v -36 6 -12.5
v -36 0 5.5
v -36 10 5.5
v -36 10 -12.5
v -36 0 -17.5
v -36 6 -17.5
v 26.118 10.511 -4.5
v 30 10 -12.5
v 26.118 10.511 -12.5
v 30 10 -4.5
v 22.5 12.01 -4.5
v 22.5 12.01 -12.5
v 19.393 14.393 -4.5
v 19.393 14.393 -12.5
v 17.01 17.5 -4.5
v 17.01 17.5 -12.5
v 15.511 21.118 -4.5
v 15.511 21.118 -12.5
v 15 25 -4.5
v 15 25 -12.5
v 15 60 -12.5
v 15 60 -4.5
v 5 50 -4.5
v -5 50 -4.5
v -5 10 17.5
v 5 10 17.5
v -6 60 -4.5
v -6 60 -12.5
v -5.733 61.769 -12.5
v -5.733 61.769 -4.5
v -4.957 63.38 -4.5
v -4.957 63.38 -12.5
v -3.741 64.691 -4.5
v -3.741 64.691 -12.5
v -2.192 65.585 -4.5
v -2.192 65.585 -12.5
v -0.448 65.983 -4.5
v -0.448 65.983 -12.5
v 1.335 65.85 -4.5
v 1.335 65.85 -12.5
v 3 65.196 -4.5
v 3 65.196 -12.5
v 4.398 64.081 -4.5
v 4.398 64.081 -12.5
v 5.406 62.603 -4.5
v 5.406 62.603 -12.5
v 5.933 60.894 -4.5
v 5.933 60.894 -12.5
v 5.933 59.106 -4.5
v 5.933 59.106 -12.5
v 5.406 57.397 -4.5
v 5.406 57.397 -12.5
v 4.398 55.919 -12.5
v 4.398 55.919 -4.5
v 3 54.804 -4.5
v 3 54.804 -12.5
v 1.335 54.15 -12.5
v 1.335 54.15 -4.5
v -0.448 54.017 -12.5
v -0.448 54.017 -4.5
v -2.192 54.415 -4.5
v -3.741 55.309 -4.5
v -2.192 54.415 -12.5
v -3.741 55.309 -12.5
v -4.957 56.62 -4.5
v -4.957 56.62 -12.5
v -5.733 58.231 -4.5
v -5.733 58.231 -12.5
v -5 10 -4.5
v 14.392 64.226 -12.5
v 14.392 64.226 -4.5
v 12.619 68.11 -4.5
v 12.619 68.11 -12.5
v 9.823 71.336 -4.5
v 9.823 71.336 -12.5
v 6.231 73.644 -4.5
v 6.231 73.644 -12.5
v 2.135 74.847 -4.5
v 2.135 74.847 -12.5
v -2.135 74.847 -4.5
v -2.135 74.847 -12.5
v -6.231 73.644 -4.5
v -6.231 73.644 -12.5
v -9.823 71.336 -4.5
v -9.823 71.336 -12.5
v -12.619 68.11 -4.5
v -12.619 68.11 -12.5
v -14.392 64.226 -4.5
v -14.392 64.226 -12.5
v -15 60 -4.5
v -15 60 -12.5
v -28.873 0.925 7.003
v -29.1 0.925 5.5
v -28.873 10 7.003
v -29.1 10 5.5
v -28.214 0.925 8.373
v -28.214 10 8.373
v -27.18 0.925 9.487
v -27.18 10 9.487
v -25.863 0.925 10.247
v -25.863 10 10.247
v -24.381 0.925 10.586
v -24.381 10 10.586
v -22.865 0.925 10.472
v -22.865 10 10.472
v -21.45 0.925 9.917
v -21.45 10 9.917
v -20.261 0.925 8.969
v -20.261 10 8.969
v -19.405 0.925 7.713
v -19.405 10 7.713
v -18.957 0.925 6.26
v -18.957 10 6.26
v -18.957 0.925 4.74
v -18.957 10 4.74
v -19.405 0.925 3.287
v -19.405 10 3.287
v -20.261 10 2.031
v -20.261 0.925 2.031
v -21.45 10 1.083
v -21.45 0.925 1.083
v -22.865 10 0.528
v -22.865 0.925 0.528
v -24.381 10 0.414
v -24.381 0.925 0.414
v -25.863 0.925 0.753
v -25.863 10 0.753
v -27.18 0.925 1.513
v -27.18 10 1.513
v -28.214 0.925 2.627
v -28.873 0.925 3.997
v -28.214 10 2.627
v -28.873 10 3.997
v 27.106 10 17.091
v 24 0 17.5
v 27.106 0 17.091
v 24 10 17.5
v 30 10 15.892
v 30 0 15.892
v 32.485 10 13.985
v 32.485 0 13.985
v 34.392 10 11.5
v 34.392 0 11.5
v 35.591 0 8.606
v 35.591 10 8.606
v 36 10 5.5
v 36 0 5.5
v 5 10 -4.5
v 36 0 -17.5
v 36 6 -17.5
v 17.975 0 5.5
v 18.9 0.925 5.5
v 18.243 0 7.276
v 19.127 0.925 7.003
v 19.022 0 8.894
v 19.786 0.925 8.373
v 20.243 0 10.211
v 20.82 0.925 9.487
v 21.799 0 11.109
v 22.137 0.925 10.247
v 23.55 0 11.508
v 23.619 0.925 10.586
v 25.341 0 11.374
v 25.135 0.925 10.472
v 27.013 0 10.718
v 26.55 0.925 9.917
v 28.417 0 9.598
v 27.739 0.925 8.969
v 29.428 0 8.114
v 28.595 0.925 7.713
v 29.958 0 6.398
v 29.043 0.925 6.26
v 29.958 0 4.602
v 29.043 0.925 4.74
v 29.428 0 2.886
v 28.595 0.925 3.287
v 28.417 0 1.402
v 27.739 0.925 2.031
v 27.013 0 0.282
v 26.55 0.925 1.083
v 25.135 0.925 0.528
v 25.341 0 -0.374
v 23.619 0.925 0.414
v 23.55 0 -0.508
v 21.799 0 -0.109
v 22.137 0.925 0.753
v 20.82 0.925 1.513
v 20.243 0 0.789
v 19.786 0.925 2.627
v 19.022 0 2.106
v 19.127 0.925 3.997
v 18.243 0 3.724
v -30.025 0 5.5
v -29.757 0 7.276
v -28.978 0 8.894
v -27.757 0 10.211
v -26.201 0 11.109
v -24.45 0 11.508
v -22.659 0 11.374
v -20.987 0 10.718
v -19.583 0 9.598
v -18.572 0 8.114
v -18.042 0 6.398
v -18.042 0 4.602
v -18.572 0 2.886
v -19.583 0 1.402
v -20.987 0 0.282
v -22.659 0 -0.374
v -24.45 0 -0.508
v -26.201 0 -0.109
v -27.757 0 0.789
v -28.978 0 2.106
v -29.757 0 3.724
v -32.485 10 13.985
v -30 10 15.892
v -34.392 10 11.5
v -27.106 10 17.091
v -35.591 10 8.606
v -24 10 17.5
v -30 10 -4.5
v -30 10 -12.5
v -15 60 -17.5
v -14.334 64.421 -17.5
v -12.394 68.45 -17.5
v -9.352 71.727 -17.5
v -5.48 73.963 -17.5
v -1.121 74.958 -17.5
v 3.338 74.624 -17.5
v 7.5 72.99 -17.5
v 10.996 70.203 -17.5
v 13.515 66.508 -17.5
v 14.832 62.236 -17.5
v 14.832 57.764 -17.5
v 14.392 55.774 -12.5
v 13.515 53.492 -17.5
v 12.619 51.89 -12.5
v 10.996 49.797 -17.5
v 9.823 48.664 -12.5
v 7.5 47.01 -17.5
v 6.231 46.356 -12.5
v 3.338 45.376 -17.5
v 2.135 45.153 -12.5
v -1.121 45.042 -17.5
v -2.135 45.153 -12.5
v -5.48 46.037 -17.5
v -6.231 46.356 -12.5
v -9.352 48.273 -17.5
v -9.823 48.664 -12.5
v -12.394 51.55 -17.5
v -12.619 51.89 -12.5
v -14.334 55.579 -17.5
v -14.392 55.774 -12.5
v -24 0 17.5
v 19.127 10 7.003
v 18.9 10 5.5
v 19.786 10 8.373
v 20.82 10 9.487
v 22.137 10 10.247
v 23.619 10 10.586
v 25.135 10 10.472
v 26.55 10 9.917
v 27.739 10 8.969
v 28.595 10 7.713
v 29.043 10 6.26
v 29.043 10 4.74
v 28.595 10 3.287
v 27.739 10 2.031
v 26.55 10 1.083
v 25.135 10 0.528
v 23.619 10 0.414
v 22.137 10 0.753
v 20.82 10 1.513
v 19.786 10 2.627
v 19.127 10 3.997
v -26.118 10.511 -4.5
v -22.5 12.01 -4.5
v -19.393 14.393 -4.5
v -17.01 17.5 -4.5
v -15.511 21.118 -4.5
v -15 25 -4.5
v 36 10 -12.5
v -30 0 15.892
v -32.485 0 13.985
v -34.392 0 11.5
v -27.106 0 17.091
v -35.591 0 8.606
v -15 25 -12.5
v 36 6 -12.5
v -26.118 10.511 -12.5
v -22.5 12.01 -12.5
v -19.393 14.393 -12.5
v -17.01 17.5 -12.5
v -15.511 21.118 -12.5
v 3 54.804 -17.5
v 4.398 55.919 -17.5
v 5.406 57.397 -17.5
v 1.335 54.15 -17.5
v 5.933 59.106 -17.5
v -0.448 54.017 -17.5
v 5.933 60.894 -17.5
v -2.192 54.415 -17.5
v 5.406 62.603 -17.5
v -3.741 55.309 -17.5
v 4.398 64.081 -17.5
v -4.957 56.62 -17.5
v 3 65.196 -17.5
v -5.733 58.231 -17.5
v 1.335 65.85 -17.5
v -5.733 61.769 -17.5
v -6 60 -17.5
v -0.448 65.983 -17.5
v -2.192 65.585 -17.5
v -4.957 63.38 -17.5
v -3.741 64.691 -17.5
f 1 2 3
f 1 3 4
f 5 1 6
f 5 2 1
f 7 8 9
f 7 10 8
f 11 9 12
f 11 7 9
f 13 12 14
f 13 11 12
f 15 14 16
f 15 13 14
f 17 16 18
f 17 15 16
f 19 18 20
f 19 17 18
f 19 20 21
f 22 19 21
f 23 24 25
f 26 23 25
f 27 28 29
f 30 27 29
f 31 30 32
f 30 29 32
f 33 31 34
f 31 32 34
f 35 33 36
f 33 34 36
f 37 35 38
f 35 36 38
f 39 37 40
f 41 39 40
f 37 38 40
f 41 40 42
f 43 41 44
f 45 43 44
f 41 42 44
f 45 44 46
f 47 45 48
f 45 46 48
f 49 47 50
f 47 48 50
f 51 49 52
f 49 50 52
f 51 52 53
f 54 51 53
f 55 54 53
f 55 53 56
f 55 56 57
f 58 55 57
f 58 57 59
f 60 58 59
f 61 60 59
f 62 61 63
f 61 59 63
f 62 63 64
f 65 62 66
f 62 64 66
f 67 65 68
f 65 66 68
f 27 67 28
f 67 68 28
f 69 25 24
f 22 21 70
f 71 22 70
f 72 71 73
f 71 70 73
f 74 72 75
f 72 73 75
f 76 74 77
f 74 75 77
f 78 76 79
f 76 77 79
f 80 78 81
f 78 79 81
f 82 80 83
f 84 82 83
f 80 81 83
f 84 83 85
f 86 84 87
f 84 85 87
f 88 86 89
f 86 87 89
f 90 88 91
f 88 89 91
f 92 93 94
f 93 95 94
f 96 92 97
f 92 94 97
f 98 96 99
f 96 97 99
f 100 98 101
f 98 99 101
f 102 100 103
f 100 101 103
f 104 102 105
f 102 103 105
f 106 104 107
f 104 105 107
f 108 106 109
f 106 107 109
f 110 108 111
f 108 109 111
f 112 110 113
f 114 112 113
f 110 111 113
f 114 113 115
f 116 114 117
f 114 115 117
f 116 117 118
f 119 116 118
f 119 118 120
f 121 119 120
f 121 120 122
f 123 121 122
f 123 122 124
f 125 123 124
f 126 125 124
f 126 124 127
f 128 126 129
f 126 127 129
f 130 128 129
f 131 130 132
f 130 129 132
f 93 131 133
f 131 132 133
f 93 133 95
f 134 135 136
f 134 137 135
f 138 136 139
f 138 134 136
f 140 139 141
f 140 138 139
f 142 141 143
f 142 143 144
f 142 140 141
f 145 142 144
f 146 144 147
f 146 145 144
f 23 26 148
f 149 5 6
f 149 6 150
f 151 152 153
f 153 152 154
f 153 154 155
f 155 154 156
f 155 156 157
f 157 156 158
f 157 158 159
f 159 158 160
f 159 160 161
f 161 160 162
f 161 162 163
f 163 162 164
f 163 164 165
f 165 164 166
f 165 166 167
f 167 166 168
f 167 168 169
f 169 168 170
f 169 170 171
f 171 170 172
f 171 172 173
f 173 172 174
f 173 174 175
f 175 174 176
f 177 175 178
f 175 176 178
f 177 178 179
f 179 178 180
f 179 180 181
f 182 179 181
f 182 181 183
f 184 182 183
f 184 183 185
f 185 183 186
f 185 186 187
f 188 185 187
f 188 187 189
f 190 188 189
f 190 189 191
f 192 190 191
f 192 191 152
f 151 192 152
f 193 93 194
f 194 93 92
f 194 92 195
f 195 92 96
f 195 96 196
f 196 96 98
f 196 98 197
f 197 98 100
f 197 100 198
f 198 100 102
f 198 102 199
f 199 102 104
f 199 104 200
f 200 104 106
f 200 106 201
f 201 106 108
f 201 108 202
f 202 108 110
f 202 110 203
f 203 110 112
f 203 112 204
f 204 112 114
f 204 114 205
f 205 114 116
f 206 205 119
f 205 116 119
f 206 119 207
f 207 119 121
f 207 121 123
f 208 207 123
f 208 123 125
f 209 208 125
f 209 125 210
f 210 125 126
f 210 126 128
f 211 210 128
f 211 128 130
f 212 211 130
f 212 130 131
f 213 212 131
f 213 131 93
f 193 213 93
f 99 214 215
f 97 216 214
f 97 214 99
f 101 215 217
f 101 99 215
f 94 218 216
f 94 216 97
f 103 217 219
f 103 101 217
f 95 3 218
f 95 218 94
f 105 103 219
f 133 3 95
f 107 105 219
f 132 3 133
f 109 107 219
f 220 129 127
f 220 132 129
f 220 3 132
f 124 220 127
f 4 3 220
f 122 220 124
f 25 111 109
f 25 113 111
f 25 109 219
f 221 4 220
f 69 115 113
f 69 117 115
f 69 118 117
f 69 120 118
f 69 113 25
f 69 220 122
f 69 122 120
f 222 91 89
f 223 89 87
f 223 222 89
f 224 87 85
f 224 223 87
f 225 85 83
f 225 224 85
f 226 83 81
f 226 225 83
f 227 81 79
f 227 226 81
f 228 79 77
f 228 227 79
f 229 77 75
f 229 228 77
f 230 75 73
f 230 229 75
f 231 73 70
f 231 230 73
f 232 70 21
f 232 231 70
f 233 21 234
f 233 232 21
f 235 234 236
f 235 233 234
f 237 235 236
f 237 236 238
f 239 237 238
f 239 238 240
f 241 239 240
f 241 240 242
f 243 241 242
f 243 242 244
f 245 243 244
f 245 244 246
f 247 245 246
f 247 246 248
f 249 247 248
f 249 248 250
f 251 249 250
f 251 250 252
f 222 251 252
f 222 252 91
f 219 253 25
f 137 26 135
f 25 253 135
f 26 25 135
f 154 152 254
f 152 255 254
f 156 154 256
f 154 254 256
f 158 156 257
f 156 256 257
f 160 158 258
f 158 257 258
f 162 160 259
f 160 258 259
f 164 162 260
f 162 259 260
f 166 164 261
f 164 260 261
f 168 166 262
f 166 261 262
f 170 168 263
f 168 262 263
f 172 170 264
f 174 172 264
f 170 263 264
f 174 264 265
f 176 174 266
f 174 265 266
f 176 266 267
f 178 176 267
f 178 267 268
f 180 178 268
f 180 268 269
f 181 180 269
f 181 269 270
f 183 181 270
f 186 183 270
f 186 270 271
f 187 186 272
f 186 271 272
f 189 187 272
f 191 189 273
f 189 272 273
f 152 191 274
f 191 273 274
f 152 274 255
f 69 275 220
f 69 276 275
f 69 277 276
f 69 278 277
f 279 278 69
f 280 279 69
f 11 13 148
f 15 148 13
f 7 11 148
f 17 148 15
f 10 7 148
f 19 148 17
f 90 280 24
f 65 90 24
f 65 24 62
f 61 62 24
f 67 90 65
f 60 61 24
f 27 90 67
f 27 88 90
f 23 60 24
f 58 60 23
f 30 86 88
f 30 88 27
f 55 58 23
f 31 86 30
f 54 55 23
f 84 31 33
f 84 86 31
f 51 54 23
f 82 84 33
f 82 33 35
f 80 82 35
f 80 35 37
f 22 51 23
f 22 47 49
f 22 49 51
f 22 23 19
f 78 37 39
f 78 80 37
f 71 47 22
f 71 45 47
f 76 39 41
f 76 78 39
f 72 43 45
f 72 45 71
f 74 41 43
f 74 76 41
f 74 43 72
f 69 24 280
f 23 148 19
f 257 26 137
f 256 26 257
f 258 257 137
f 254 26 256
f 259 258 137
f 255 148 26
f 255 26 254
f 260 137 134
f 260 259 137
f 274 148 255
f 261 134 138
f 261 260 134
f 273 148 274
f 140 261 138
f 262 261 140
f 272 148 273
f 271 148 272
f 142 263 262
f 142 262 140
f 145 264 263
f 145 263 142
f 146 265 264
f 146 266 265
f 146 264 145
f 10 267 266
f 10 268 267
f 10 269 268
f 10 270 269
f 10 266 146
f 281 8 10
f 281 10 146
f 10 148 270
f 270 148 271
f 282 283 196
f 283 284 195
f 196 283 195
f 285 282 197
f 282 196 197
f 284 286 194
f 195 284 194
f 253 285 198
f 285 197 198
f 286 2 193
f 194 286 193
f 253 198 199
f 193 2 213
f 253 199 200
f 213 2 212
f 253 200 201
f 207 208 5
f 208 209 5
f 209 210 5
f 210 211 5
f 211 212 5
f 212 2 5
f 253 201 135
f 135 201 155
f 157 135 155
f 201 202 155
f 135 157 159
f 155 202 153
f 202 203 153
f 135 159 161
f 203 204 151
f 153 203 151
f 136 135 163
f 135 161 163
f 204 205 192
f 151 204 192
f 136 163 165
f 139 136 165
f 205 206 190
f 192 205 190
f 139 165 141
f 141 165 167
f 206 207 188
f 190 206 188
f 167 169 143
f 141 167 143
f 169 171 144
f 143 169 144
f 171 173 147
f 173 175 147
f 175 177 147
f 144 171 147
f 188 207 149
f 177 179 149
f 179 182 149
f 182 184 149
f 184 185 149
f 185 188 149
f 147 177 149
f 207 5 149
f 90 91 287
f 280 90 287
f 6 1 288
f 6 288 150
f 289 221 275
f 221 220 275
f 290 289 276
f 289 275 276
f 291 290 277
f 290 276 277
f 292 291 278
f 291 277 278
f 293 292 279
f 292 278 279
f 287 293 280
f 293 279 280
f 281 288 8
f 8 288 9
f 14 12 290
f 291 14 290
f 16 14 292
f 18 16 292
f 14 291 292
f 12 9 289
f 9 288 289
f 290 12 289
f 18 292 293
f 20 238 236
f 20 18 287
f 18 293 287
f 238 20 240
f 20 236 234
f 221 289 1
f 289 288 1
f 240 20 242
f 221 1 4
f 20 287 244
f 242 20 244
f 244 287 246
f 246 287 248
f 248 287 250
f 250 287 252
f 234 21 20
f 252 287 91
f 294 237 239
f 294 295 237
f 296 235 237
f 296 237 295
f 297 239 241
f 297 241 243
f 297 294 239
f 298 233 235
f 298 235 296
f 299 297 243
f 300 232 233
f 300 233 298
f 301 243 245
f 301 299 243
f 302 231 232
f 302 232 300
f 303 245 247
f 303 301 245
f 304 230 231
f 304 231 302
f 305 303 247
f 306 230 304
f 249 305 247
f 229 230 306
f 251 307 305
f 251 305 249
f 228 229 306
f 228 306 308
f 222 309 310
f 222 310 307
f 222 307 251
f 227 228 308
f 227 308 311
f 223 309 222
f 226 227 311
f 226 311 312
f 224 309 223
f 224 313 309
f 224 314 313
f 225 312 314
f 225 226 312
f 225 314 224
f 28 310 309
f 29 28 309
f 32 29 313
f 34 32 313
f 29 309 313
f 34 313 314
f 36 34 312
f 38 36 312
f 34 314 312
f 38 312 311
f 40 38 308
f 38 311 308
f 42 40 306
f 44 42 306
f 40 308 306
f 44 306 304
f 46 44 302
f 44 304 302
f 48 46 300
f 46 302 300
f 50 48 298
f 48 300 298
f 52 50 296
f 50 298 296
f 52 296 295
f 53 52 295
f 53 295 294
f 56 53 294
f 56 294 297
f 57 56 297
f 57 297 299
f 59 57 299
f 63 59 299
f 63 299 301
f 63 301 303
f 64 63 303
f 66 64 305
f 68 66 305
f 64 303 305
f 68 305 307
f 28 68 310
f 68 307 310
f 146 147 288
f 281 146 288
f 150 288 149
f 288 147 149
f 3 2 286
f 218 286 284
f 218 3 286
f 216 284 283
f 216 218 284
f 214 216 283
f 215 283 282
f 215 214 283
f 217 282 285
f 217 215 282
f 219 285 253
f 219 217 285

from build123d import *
from build123d.topology import SkipClean

# Parameters (mm, degrees)
SKETCH1_W                    = 72
SKETCH1_H                    = 35
BOSS_EXTRUDE1_DEPTH          = 10
FILLET1_R                    = 12
CUT_EXTRUDE1_DEPTH           = 42.258332492
CUT_EXTRUDE1_DEPTH_BACK      = 42.258332492
SKETCH2_W                    = 5
SKETCH2_H                    = 4
M12_TAPPED_HOLE1_D           = 10.2
M12_TAPPED_HOLE1_CSINK_D     = 12.05
M12_TAPPED_HOLE1_CSINK_ANGLE = 90
SKETCH6_R                    = 6
BOSS_EXTRUDE2_DEPTH          = 8
FILLET2_R                    = 15
BOSS_EXTRUDE3_START          = 5
SKETCH7_R                    = 15
SKETCH7_R_2                  = 6
BOSS_EXTRUDE3_DEPTH          = 5
RIB5_START                   = -5
RIB5_DEPTH                   = 10


# Read off the part's stored shape, not the designer's step: Rib5
with BuildPart() as part:
    # Sketch1 → Boss-Extrude1 (new body)
    with BuildSketch(Plane(origin=(0, 0, 0), x_dir=(1, 0, 0), z_dir=(0, 1, 0))):
        Rectangle(SKETCH1_W, SKETCH1_H)
    extrude(amount=BOSS_EXTRUDE1_DEPTH)

    # Fillet1
    fillet1_edges = [part.edges().sort_by_distance(p)[0] for p in [
        (36, 5, 17.5),
        (-36, 5, 17.5),
    ]]
    fillet(fillet1_edges, radius=FILLET1_R)

    # Sketch2 → Cut-Extrude1 (cut, two sides: drawn at the far end of the back side and taken through both)
    with BuildSketch(Plane(origin=(0, 0, 0), x_dir=(0, 0, -1), z_dir=(1, 0, 0)).offset(-CUT_EXTRUDE1_DEPTH_BACK)):
        with Locations((15, 8)):
            Rectangle(SKETCH2_W, SKETCH2_H)
    extrude(amount=CUT_EXTRUDE1_DEPTH + CUT_EXTRUDE1_DEPTH_BACK, mode=Mode.SUBTRACT)

    # M12 Tapped Hole1 (through all)
    with Locations(Plane.XZ):
        with Locations((-24, 5.5), (24, 5.5)):
            CounterSinkHole(M12_TAPPED_HOLE1_D / 2, M12_TAPPED_HOLE1_CSINK_D / 2, counter_sink_angle=M12_TAPPED_HOLE1_CSINK_ANGLE)

    # Sketch6 → Boss-Extrude2 (add)
    with BuildSketch(Plane(origin=(0, 0, -12.5), x_dir=(-1, 0, 0), z_dir=(0, 0, -1))):
        with BuildLine():
            Line((15, 10), (-15, 10))
            Line((-15, 10), (-15, 60))
            ThreePointArc((-15, 60), (0, 75), (15, 60))
            Line((15, 60), (15, 10))
        make_face()
        with Locations((0, 60)):
            Circle(SKETCH6_R, mode=Mode.SUBTRACT)
    extrude(amount=-BOSS_EXTRUDE2_DEPTH)

    # Fillet2
    fillet2_edges = [part.edges().sort_by_distance(p)[0] for p in [
        (-15, 10, -8.5),
        (15, 10, -8.5),
    ]]
    fillet(fillet2_edges, radius=FILLET2_R)

    # Sketch7 → Boss-Extrude3 (add)
    with SkipClean():  # the faces are left unmerged after this step: merging them gives an invalid solid
        with BuildSketch(Plane(origin=(0, 0, -12.5), x_dir=(-1, 0, 0), z_dir=(0, 0, -1)).offset(BOSS_EXTRUDE3_START)):
            with Locations((0, 60)):
                Circle(SKETCH7_R)
            with Locations((0, 60)):
                Circle(SKETCH7_R_2, mode=Mode.SUBTRACT)
        extrude(amount=-BOSS_EXTRUDE3_DEPTH)

    # Rib5 outline → Rib5 (add)
    with SkipClean():  # the faces are left unmerged after this step: merging them gives an invalid solid
        with BuildSketch(Plane(origin=(0, 0, 0), x_dir=(0, 0, -1), z_dir=(1, 0, 0)).offset(RIB5_START)):
            Polygon((4.5, 50), (-17.5, 10), (4.5, 10), align=None)
        extrude(amount=RIB5_DEPTH)


solid = part.part
